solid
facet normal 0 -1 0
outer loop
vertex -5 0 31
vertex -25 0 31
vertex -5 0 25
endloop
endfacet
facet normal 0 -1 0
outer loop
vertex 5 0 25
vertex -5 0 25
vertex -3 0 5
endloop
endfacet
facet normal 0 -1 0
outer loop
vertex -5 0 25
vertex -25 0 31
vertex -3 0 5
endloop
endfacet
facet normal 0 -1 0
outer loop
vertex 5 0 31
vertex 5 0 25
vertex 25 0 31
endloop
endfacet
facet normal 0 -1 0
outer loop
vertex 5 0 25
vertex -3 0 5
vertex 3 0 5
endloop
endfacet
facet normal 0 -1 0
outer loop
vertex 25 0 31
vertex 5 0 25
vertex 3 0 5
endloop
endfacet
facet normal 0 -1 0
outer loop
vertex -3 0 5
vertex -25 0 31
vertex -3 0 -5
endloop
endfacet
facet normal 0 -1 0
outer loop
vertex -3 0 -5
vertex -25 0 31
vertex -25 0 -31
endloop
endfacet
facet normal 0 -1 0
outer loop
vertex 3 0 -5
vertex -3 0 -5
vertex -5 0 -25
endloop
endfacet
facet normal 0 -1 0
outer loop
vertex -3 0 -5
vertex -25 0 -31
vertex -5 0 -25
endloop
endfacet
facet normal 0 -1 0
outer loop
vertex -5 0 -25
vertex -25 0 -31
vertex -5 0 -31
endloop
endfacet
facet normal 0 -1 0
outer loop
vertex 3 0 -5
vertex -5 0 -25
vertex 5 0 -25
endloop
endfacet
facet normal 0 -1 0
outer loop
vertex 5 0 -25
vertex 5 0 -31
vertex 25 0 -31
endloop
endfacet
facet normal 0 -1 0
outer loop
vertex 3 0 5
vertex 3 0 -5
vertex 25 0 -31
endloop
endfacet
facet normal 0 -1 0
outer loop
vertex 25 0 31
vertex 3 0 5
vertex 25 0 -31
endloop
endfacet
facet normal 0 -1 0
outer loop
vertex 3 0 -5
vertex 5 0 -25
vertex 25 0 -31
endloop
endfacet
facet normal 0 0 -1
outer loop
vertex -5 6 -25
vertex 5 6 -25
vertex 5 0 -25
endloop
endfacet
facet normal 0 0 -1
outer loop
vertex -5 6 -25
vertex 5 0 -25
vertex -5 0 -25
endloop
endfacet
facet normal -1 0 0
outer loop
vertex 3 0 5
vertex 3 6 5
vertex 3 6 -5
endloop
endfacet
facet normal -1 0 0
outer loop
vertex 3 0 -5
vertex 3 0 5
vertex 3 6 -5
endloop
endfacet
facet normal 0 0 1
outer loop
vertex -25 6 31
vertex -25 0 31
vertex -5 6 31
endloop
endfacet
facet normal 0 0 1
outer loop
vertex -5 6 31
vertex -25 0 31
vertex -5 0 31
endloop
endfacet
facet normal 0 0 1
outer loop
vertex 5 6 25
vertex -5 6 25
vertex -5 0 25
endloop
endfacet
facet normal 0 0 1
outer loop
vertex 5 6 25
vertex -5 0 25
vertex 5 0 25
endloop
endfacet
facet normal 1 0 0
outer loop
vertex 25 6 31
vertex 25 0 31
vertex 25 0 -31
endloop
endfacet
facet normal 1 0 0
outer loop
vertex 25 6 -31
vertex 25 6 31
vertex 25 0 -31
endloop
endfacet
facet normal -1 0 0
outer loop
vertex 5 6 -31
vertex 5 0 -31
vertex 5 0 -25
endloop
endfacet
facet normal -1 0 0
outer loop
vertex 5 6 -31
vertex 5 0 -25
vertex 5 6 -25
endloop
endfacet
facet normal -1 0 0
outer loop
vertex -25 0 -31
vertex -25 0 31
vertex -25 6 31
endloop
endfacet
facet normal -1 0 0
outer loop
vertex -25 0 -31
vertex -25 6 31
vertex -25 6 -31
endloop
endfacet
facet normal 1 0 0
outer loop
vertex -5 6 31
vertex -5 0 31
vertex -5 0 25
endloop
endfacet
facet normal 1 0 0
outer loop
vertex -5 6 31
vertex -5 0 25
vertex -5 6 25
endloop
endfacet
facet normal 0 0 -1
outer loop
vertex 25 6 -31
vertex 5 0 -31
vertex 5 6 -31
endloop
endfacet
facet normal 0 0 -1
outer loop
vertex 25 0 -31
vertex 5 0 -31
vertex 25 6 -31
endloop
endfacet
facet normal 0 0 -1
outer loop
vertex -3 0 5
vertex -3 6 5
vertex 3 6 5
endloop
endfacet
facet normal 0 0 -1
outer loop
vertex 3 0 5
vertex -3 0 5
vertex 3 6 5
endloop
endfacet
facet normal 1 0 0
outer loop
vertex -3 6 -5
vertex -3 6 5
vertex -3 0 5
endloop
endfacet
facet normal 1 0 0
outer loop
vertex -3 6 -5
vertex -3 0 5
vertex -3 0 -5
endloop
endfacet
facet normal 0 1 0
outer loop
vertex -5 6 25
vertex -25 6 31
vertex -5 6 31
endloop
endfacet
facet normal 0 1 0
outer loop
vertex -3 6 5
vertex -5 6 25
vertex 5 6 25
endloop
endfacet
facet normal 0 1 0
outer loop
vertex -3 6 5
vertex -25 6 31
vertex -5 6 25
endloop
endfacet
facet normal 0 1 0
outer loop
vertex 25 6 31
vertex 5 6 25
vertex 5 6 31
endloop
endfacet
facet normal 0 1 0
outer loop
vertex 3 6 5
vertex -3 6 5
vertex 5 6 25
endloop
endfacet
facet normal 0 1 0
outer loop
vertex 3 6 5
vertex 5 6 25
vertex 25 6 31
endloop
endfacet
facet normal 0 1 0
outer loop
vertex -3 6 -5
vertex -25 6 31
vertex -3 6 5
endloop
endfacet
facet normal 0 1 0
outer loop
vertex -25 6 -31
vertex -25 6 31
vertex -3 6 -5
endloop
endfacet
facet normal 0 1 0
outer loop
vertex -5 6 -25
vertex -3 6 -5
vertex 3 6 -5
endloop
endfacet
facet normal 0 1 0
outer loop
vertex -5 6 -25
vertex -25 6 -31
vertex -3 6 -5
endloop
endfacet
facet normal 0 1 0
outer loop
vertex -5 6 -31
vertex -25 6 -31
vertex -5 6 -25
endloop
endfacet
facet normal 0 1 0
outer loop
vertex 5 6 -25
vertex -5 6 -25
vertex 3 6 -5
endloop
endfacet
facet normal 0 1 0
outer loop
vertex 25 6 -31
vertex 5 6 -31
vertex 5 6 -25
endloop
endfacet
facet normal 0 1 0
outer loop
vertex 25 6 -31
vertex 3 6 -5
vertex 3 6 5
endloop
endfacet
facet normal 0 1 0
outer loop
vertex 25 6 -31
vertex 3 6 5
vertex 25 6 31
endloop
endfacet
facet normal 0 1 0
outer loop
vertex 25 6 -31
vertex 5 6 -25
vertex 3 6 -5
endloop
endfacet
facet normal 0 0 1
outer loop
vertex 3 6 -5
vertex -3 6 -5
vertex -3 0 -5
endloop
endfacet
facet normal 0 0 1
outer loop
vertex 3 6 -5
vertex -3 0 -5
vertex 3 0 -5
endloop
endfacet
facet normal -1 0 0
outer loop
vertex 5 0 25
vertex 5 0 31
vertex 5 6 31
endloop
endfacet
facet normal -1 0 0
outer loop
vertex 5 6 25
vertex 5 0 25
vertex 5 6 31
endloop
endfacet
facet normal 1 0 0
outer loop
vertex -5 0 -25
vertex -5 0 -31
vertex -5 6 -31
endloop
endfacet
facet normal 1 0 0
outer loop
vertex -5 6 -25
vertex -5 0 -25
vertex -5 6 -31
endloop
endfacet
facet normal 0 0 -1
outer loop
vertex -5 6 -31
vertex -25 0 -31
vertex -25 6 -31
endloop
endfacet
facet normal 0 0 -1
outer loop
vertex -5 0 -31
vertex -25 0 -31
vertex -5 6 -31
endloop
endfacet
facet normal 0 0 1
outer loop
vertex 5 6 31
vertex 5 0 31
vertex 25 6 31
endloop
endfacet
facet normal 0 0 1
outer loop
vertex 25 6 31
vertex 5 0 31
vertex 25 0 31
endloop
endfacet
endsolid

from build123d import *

# Parameters (mm, degrees)
ESBO_O1_W                = 50
ESBO_O1_H                = 62
RESSALTO_EXTRUS_O2_DEPTH = 6
ESBO_O3_W                = 10
ESBO_O3_H                = 6
CORTE_EXTRUS_O1_DEPTH    = 6
ESBO_O4_W                = 10
ESBO_O4_H                = 6
CORTE_EXTRUS_O2_DEPTH    = 6
ESBO_O5_W                = 6
ESBO_O5_H                = 10
CORTE_EXTRUS_O3_DEPTH    = 6


with BuildPart() as part:
    # Esboço1 → Ressalto-extrusão2 (new body)
    with BuildSketch(Plane(origin=(0, 0, 0), x_dir=(1, 0, 0), z_dir=(0, 1, 0))):
        Rectangle(ESBO_O1_W, ESBO_O1_H)
    extrude(amount=RESSALTO_EXTRUS_O2_DEPTH)

    # Esboço3 → Corte-extrusão1 (cut)
    with BuildSketch(Plane.XY.offset(31)):
        with Locations((0, 3)):
            Rectangle(ESBO_O3_W, ESBO_O3_H)
    extrude(amount=-CORTE_EXTRUS_O1_DEPTH, mode=Mode.SUBTRACT)

    # Esboço4 → Corte-extrusão2 (cut)
    with BuildSketch(Plane(origin=(0, 0, -31), x_dir=(-1, 0, 0), z_dir=(0, 0, -1))):
        with Locations((0, 3)):
            Rectangle(ESBO_O4_W, ESBO_O4_H)
    extrude(amount=-CORTE_EXTRUS_O2_DEPTH, mode=Mode.SUBTRACT)

    # Esboço5 → Corte-extrusão3 (cut)
    with BuildSketch(Plane(origin=(0, 6, 0), x_dir=(1, 0, 0), z_dir=(0, 1, 0))):
        Rectangle(ESBO_O5_W, ESBO_O5_H)
    extrude(amount=-CORTE_EXTRUS_O3_DEPTH, mode=Mode.SUBTRACT)


solid = part.part
